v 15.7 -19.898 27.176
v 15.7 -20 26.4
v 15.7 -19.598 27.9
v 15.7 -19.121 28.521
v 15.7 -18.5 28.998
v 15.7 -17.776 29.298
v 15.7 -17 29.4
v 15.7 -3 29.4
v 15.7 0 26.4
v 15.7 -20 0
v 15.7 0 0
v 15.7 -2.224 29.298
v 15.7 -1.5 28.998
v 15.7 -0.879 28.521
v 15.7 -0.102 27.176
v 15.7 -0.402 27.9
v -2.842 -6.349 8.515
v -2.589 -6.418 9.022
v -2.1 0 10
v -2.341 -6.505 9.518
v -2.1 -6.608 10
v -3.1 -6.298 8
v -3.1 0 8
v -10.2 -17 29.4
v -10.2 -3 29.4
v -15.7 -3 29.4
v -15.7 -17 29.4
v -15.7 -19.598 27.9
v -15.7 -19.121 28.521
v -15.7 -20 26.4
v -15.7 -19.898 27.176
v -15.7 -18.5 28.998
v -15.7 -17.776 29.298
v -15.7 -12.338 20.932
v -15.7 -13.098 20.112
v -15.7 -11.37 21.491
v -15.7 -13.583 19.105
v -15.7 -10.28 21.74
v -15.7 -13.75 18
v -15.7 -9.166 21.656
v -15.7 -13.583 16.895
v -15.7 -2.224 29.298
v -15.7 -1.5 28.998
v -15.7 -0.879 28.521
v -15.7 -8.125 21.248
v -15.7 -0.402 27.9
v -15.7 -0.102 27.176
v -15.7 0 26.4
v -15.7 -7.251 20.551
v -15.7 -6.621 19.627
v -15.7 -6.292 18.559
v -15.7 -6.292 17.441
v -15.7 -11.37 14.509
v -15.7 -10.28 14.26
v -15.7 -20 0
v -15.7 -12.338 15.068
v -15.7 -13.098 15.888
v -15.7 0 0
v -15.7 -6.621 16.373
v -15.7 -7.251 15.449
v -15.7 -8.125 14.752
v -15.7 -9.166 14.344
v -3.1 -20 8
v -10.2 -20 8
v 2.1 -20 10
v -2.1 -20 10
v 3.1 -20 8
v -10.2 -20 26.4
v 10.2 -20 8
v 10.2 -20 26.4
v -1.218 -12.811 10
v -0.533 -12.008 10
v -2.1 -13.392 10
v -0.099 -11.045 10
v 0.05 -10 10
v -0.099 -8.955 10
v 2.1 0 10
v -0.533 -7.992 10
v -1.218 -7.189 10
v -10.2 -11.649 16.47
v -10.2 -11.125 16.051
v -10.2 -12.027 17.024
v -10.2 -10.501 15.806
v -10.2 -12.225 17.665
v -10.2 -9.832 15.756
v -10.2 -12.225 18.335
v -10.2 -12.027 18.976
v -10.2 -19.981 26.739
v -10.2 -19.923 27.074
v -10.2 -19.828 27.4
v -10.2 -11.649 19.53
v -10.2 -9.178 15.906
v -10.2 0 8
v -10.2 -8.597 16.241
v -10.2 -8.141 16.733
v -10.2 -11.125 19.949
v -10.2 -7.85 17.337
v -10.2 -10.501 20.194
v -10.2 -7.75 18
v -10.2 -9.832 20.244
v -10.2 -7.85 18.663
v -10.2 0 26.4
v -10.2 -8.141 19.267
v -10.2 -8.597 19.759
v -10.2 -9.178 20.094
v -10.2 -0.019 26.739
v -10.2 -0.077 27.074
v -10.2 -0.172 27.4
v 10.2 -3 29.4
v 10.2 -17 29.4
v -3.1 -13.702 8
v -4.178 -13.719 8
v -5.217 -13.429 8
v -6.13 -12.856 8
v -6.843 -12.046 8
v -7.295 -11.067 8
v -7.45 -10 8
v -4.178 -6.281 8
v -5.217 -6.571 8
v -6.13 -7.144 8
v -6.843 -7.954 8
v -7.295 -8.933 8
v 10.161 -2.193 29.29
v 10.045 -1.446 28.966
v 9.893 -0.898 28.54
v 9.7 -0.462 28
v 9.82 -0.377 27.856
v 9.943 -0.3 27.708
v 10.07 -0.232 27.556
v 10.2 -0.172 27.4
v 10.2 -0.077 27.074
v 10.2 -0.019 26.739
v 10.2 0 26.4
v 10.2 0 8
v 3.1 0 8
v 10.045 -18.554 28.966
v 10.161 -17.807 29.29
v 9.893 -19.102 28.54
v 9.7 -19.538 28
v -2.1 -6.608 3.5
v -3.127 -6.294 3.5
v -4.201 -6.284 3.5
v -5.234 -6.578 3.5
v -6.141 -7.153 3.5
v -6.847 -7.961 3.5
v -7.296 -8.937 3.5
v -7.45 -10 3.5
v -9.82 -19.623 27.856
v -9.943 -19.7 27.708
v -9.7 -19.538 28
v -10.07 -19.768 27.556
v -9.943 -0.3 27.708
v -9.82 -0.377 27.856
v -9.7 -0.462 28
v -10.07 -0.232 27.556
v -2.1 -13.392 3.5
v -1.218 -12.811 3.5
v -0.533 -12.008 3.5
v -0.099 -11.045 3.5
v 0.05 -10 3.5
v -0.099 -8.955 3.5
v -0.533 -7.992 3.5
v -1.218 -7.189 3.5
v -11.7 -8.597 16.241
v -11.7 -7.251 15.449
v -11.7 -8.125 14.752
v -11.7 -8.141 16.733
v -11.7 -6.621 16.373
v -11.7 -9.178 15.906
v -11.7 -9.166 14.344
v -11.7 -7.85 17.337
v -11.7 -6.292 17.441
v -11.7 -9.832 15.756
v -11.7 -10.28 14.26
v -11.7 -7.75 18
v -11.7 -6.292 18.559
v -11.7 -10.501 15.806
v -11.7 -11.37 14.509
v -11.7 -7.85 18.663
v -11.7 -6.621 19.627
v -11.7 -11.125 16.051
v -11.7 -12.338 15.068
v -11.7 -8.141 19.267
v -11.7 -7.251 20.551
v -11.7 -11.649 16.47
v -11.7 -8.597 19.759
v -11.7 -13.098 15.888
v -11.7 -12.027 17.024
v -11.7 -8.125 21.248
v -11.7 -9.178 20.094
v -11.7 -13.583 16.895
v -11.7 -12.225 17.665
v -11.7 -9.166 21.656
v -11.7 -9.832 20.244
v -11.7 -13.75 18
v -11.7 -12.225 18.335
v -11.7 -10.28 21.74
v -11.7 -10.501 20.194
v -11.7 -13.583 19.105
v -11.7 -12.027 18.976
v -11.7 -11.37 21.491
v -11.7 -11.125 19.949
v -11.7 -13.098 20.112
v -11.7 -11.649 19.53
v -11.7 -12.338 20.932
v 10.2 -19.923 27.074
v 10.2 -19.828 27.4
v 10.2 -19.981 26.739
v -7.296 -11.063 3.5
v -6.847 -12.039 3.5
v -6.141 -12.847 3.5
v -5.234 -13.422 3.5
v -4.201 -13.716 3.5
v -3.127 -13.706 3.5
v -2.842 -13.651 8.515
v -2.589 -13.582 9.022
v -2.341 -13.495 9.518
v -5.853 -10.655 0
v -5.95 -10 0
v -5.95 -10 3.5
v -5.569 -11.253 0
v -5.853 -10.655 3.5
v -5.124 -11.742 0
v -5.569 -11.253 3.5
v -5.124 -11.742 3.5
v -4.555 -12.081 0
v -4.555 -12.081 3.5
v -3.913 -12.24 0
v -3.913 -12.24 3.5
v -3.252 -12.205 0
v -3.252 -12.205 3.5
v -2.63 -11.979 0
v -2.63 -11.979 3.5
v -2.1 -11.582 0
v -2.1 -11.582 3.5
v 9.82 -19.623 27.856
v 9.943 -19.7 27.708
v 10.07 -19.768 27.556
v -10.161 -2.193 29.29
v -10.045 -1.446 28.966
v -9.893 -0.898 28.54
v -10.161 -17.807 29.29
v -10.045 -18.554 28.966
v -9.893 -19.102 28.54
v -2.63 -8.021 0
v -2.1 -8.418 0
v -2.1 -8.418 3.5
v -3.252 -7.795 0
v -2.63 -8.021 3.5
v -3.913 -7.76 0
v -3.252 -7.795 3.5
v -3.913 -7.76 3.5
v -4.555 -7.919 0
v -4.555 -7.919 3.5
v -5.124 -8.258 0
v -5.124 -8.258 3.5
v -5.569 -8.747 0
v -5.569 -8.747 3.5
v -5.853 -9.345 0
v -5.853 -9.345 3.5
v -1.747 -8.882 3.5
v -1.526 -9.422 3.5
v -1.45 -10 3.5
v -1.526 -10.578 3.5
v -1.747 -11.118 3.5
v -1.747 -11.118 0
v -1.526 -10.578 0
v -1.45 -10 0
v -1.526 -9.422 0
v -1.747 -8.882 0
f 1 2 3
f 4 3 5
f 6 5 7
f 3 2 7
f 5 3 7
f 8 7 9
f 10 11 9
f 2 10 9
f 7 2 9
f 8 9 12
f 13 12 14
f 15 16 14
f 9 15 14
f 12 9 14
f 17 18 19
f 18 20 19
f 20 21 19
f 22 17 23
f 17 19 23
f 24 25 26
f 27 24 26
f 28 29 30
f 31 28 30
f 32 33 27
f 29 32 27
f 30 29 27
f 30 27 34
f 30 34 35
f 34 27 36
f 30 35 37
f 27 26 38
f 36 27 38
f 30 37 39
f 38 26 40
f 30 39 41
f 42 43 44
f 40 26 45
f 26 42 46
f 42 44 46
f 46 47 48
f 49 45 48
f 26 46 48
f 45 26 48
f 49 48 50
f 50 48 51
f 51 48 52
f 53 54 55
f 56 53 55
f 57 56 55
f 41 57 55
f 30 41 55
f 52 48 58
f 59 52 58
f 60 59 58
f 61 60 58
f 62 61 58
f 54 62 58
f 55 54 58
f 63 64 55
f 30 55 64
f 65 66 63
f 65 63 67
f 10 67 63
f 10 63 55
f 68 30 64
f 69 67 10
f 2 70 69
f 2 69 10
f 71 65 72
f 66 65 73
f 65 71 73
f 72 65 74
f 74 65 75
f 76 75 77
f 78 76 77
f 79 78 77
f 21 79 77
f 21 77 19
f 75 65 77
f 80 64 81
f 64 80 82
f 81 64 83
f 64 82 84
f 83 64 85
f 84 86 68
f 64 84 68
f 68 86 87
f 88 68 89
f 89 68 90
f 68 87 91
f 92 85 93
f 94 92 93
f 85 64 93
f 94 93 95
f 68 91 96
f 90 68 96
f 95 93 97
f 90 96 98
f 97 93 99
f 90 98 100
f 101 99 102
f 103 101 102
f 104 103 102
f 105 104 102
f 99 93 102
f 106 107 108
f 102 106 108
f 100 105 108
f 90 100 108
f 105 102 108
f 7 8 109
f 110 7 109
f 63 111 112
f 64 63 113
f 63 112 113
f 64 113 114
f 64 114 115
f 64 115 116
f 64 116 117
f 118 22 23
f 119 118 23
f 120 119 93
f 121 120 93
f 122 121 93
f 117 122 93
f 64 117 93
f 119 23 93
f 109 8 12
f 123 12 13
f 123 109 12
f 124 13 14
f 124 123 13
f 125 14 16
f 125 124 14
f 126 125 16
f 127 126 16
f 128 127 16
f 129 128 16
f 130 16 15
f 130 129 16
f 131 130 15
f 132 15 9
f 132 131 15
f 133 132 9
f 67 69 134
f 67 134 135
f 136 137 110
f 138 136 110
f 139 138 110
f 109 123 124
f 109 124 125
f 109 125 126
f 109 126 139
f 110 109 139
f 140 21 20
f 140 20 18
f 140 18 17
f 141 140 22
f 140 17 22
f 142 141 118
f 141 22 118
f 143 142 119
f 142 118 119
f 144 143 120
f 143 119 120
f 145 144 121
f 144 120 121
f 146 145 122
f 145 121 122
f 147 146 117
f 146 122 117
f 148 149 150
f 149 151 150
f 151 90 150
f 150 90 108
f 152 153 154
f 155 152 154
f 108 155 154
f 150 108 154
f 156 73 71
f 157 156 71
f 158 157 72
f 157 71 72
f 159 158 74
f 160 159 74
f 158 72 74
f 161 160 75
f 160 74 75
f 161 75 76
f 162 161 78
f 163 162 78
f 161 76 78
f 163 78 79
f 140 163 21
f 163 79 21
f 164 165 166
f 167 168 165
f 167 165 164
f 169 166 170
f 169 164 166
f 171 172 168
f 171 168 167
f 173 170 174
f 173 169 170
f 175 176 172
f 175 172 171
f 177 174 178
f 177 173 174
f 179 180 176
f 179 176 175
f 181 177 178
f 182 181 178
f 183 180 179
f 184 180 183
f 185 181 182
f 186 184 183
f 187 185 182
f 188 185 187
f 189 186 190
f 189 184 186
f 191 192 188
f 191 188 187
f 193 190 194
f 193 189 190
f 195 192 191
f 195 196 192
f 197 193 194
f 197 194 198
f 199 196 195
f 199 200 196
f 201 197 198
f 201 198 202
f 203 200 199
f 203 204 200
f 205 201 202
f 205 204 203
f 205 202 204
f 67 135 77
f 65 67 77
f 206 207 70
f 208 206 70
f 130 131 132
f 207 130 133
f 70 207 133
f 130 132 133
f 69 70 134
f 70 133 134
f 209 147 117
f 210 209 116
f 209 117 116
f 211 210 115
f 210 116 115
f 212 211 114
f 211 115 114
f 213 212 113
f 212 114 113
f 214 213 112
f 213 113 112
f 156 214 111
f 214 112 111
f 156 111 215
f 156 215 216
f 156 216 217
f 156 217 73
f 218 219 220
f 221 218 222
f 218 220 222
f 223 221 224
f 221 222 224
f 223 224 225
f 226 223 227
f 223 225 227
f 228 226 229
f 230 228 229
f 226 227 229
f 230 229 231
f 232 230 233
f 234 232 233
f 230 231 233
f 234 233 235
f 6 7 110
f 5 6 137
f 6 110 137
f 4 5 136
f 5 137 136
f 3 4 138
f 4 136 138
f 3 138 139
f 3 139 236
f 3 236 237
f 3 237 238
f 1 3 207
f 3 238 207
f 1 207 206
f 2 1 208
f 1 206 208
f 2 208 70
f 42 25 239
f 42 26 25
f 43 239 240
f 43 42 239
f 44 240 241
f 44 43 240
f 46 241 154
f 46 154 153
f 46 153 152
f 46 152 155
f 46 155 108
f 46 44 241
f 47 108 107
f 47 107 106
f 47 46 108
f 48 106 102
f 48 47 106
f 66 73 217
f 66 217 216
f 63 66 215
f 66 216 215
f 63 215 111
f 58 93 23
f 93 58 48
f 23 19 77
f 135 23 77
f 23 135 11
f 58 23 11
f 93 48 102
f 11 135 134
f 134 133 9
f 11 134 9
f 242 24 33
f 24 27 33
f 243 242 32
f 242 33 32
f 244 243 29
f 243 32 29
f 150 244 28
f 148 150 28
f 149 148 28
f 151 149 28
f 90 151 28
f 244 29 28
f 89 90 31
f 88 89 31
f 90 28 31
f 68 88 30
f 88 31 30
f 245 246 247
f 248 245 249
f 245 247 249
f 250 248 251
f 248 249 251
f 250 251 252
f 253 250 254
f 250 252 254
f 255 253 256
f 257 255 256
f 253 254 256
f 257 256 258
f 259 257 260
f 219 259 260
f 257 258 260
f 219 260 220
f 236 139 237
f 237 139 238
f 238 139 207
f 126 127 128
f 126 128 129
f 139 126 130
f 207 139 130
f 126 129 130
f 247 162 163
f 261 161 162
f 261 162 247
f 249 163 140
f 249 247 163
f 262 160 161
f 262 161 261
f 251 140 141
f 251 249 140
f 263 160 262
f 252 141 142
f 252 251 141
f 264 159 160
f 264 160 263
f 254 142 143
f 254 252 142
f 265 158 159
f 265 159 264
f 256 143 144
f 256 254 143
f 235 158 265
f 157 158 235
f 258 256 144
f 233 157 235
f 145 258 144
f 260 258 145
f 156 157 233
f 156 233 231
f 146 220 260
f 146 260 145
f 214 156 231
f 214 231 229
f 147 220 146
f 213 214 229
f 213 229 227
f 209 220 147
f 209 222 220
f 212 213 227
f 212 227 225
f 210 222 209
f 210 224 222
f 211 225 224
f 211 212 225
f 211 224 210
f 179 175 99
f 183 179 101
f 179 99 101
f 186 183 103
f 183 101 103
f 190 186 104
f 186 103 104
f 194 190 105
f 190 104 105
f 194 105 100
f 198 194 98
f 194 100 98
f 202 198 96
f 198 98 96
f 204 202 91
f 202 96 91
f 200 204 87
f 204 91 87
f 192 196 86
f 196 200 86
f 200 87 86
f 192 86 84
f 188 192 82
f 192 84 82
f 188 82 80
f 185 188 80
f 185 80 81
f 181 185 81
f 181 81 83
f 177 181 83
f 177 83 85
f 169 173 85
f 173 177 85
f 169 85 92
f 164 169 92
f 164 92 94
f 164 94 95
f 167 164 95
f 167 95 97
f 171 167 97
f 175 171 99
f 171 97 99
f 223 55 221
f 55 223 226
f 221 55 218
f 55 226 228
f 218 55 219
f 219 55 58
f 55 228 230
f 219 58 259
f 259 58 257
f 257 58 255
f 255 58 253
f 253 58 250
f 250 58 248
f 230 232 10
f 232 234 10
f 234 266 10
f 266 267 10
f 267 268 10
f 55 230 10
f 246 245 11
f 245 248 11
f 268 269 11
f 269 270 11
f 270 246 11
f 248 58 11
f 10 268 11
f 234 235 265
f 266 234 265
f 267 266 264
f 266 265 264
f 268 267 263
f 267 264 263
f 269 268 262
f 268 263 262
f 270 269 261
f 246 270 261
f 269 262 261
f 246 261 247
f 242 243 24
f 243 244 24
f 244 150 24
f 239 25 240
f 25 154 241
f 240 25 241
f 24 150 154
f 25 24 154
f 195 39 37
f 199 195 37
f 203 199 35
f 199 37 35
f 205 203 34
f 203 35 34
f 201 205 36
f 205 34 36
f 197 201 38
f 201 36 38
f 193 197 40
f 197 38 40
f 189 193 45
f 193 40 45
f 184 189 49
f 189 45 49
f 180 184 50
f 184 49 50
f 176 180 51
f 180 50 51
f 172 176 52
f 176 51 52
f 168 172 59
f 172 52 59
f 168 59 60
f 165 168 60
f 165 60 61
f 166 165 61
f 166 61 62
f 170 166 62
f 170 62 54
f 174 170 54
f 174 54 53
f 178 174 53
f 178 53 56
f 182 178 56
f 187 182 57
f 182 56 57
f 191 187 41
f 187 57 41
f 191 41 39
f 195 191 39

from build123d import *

# Parameters (mm, degrees)
F1_DEPTH  = 20
F2_R      = 3
F4_DEPTH  = 10.001
F5_DEPTH  = 6.5
F6_ANGLE  = -90
F7_R      = 2.25
F8_DEPTH  = 5.5
F9_R      = 3.75
F9_R_2    = 2.25
F10_DEPTH = 4


with BuildPart() as f1:
    # F0 (on Top) → F1 (new body)
    with BuildSketch(Plane.XY):
        Polygon((-15.7, 0), (0, 0), (15.7, 0), (15.7, 29.4), (10.2, 29.4), (9.7, 28), (10.2, 27.4), (10.2, 8), (3.1, 8), (2.1, 10), (0, 10), (-2.1, 10), (-3.1, 8), (-10.2, 8), (-10.2, 27.4), (-9.7, 28), (-10.2, 29.4), (-15.7, 29.4), align=None)
    extrude(amount=F1_DEPTH)

    # F2
    f2_edges = [f1.edges().sort_by_distance(p)[0] for p in [
        (12.95, 29.4, 20),
        (-12.95, 29.4, 20),
        (-12.95, 29.4, 0),
        (12.95, 29.4, 0),
    ]]
    fillet(f2_edges, radius=F2_R)

    # F3 (on face) → F4 (cut, through all)
    with BuildSketch(Plane(origin=(0, 10, 0), x_dir=(-1, 0, 0), z_dir=(0, 1, 0))):
        with BuildLine():
            ThreePointArc((5.95, 10), (4.5551315688, 12.0811655388), (2.1, 11.581929202))
            Line((2.1, 11.581929202), (2.1, 8.418070798))
            ThreePointArc((2.1, 8.418070798), (4.5551315688, 7.9188344612), (5.95, 10))
        make_face()
        with BuildLine():
            Line((2.1, 8.418070798), (2.1, 11.581929202))
            ThreePointArc((2.1, 11.581929202), (1.45, 10), (2.1, 8.418070798))
        make_face()
    extrude(amount=-F4_DEPTH, mode=Mode.SUBTRACT)

    # F3 (on face) → F5 (cut)
    with BuildSketch(Plane(origin=(0, 10, 0), x_dir=(-1, 0, 0), z_dir=(0, 1, 0))):
        with BuildLine():
            ThreePointArc((2.1, 6.6084664236), (5.7077973005, 6.8327851352), (7.45, 10))
            ThreePointArc((7.45, 10), (5.7077973005, 13.1672148648), (2.1, 13.3915335764))
            Line((2.1, 13.3915335764), (2.1, 11.581929202))
            ThreePointArc((2.1, 11.581929202), (4.5551315688, 12.0811655388), (5.95, 10))
            ThreePointArc((5.95, 10), (4.5551315688, 7.9188344612), (2.1, 8.418070798))
            Line((2.1, 8.418070798), (2.1, 6.6084664236))
        make_face()
        with BuildLine():
            Line((2.1, 11.581929202), (2.1, 13.3915335764))
            ThreePointArc((2.1, 13.3915335764), (-0.05, 10), (2.1, 6.6084664236))
            Line((2.1, 6.6084664236), (2.1, 8.418070798))
            ThreePointArc((2.1, 8.418070798), (1.45, 10), (2.1, 11.581929202))
        make_face()
    extrude(amount=-F5_DEPTH, mode=Mode.SUBTRACT)


with BuildPart() as f1_1:
    # F6: moved
    add(f1.part.rotate(Axis((0, 0, 0), (-1, 0, 0)), F6_ANGLE))

    # F7 (on face) → F8 (cut, through all)
    with BuildSketch(Plane.YZ.offset(-10.2)):
        with Locations((-10, 18)):
            Circle(F7_R)
    extrude(amount=-F8_DEPTH, mode=Mode.SUBTRACT)

    # F9 (on face) → F10 (cut)
    with BuildSketch(Plane(origin=(-15.7, 0, 0), x_dir=(0, -1, 0), z_dir=(-1, 0, 0))):
        with Locations((10, 18)):
            Circle(F9_R)
        with Locations((10, 18)):
            Circle(F9_R_2, mode=Mode.SUBTRACT)
    extrude(amount=-F10_DEPTH, mode=Mode.SUBTRACT)


solid = f1_1.part
